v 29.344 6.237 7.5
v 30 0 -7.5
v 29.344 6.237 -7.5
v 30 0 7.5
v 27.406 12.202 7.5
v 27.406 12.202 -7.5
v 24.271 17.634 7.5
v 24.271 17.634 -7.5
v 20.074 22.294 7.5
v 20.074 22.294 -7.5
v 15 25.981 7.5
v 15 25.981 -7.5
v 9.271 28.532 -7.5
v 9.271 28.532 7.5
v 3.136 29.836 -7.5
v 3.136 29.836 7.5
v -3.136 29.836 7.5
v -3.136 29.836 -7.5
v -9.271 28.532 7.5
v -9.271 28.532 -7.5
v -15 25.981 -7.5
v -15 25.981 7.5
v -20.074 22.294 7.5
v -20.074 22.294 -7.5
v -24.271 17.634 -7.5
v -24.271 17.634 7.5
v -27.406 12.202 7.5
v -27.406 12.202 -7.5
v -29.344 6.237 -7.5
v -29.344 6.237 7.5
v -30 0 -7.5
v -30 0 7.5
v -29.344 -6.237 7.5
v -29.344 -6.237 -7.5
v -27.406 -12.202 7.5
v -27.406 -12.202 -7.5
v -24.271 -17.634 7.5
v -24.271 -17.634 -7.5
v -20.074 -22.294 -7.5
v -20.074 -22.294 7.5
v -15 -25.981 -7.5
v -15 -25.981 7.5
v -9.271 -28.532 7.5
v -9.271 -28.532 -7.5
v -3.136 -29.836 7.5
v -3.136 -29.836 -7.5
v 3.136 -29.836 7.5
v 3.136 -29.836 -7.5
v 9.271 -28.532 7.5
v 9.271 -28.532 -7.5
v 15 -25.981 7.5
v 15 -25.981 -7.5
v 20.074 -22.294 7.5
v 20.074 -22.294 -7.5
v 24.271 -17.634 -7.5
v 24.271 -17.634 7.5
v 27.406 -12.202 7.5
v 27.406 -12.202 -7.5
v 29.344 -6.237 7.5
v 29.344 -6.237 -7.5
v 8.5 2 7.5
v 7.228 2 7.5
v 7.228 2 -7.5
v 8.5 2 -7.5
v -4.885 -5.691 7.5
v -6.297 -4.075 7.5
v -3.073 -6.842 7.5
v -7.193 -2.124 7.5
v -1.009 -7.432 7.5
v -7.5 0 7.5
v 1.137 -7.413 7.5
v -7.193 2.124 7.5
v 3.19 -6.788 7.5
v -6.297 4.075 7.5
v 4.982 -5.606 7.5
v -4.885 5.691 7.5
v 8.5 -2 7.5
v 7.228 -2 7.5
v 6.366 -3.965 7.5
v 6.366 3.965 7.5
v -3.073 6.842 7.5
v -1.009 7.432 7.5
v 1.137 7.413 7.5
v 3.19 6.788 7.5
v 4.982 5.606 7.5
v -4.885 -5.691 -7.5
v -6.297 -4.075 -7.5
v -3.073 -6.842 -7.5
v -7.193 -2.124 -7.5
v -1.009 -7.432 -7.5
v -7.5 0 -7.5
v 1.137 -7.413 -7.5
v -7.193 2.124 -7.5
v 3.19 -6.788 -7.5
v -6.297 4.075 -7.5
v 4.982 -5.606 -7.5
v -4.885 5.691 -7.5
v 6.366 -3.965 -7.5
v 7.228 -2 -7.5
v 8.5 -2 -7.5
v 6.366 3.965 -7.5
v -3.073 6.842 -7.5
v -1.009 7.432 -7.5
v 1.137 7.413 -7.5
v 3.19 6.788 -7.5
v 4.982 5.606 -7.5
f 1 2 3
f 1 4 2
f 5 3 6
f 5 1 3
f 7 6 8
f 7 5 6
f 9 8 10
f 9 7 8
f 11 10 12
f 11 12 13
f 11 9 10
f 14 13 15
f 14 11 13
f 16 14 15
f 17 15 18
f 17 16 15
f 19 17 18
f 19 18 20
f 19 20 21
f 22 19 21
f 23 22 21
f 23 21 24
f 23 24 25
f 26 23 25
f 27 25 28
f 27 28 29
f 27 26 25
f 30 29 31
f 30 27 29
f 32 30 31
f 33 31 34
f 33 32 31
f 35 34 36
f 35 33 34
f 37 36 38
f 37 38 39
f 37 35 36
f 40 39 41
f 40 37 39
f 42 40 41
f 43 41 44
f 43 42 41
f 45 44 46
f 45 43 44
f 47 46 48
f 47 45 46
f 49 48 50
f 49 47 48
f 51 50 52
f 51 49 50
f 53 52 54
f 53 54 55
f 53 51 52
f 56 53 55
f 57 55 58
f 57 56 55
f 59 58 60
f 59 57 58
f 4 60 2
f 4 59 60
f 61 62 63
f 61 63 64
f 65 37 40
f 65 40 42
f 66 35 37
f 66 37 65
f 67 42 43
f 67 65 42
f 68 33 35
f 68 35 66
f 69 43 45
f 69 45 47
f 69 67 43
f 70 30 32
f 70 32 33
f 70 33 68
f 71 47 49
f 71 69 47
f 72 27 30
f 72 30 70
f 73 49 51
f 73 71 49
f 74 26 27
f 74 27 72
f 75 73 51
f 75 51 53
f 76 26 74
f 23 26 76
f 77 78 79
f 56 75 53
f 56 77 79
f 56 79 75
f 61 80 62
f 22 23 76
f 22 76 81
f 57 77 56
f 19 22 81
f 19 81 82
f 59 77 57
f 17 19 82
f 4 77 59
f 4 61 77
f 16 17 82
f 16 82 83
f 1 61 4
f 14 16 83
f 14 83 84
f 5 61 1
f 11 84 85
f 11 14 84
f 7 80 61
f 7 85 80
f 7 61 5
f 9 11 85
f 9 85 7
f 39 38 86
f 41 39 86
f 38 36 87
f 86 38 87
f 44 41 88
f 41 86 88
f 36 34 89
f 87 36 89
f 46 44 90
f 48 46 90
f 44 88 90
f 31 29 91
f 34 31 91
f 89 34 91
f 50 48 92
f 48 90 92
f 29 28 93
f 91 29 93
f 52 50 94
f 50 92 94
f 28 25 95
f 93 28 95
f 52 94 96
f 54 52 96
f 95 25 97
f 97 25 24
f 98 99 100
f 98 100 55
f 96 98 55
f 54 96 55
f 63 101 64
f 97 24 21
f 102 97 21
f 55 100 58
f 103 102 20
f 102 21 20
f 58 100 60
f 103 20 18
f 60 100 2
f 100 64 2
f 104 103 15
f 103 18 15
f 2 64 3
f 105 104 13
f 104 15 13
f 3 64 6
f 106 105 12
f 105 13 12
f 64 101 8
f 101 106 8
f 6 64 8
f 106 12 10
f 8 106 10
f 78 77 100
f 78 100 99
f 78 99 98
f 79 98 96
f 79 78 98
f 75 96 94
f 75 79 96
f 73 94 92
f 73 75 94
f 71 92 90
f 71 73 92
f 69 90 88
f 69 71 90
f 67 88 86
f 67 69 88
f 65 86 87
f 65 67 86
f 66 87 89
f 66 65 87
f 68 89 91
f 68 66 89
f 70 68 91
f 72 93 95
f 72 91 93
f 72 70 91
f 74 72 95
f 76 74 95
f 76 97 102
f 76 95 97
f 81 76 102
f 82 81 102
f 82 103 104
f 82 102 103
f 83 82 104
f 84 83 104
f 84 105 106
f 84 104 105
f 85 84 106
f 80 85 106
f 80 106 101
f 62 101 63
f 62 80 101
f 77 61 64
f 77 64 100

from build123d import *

# Parameters (mm, degrees)
SKETCH_1_R          = 30
EXTRUDE_1_DEPTH     = 7.5
CUT_EXTRUDE_1_DEPTH = 30


with BuildPart() as part:
    # 草图1 → 凸台-拉伸1 (new, symmetric)
    with BuildSketch(Plane.XY):
        Circle(SKETCH_1_R)
    extrude(amount=EXTRUDE_1_DEPTH, both=True)

    # 草图2 → 切除-拉伸1 (cut)
    with BuildSketch(Plane.XY.offset(7.5)):
        with BuildLine():
            Line((7.228416147, 2), (8.5, 2))
            Line((8.5, 2), (8.5, -2))
            Line((8.5, -2), (7.228416147, -2))
            ThreePointArc((7.228416147, -2), (-7.5, 0), (7.228416147, 2))
        make_face()
    extrude(amount=-CUT_EXTRUDE_1_DEPTH, mode=Mode.SUBTRACT)


solid = part.part
